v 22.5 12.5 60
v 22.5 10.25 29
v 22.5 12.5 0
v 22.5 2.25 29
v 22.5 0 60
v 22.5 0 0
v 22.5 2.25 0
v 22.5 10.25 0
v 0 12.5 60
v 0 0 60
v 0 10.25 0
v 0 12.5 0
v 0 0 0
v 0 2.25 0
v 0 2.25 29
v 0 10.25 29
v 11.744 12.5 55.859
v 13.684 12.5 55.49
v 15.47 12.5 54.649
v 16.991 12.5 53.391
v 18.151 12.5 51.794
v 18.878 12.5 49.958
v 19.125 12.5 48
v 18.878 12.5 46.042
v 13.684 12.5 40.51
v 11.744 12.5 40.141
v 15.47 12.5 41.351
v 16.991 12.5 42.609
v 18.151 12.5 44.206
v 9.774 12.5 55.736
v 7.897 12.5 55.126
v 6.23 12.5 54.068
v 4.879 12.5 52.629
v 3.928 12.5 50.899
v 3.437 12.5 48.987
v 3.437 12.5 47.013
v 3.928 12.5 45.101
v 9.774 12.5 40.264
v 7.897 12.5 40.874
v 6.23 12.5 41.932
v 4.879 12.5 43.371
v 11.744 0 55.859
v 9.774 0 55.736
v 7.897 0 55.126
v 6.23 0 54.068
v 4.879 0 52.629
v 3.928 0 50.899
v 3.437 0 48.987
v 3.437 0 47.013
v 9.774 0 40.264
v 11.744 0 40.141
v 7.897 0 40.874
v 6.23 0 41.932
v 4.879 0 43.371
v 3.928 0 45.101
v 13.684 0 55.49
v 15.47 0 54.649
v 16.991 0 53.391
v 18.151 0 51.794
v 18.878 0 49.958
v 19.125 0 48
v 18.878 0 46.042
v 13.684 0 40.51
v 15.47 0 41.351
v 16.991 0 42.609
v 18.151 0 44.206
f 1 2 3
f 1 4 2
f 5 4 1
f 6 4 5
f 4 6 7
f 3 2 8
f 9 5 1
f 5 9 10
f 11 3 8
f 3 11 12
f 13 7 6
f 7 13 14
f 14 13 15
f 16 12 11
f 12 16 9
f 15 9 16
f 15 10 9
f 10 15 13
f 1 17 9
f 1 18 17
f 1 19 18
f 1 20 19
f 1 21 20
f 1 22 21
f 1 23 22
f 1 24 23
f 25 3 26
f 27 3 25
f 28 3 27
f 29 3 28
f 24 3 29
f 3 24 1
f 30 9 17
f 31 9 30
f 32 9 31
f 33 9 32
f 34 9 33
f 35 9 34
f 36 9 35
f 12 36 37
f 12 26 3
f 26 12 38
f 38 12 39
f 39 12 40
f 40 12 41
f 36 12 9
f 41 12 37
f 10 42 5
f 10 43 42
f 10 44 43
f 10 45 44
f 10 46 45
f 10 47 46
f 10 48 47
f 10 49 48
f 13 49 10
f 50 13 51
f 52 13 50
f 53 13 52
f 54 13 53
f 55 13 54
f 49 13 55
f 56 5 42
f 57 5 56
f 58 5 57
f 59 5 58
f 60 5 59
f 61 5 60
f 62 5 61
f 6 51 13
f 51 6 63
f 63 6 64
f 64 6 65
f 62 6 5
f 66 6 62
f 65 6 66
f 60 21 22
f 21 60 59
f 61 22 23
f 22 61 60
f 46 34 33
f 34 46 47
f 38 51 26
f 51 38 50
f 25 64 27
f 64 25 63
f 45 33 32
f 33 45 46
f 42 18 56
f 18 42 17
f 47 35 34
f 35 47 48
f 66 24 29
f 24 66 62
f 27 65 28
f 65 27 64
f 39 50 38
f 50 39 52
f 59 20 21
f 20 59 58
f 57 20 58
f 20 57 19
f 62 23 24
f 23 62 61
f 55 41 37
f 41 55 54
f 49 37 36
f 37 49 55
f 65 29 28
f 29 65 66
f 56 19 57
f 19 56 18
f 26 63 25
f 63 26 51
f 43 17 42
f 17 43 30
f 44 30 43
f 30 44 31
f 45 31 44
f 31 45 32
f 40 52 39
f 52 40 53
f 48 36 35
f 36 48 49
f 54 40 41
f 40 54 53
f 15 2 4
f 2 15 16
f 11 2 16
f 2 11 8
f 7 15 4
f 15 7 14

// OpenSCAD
hose_diam = 15;
//barrel    = 22;
barrel    =  8;

difference() {
    //holder
    cube( [ 1.5*hose_diam, 0.3*hose_diam+barrel, 4*hose_diam ] );
    
    //hose
    translate([0.75*hose_diam, 2*hose_diam, 3.2*hose_diam]) rotate([ 90, 0, 0 ]) cylinder( d = 1.05*hose_diam, h = 3*hose_diam );

    //barrel
    translate([-hose_diam, 0.15*hose_diam, -1]) cube( [ 4*hose_diam, barrel, 2*hose_diam ] );

}
